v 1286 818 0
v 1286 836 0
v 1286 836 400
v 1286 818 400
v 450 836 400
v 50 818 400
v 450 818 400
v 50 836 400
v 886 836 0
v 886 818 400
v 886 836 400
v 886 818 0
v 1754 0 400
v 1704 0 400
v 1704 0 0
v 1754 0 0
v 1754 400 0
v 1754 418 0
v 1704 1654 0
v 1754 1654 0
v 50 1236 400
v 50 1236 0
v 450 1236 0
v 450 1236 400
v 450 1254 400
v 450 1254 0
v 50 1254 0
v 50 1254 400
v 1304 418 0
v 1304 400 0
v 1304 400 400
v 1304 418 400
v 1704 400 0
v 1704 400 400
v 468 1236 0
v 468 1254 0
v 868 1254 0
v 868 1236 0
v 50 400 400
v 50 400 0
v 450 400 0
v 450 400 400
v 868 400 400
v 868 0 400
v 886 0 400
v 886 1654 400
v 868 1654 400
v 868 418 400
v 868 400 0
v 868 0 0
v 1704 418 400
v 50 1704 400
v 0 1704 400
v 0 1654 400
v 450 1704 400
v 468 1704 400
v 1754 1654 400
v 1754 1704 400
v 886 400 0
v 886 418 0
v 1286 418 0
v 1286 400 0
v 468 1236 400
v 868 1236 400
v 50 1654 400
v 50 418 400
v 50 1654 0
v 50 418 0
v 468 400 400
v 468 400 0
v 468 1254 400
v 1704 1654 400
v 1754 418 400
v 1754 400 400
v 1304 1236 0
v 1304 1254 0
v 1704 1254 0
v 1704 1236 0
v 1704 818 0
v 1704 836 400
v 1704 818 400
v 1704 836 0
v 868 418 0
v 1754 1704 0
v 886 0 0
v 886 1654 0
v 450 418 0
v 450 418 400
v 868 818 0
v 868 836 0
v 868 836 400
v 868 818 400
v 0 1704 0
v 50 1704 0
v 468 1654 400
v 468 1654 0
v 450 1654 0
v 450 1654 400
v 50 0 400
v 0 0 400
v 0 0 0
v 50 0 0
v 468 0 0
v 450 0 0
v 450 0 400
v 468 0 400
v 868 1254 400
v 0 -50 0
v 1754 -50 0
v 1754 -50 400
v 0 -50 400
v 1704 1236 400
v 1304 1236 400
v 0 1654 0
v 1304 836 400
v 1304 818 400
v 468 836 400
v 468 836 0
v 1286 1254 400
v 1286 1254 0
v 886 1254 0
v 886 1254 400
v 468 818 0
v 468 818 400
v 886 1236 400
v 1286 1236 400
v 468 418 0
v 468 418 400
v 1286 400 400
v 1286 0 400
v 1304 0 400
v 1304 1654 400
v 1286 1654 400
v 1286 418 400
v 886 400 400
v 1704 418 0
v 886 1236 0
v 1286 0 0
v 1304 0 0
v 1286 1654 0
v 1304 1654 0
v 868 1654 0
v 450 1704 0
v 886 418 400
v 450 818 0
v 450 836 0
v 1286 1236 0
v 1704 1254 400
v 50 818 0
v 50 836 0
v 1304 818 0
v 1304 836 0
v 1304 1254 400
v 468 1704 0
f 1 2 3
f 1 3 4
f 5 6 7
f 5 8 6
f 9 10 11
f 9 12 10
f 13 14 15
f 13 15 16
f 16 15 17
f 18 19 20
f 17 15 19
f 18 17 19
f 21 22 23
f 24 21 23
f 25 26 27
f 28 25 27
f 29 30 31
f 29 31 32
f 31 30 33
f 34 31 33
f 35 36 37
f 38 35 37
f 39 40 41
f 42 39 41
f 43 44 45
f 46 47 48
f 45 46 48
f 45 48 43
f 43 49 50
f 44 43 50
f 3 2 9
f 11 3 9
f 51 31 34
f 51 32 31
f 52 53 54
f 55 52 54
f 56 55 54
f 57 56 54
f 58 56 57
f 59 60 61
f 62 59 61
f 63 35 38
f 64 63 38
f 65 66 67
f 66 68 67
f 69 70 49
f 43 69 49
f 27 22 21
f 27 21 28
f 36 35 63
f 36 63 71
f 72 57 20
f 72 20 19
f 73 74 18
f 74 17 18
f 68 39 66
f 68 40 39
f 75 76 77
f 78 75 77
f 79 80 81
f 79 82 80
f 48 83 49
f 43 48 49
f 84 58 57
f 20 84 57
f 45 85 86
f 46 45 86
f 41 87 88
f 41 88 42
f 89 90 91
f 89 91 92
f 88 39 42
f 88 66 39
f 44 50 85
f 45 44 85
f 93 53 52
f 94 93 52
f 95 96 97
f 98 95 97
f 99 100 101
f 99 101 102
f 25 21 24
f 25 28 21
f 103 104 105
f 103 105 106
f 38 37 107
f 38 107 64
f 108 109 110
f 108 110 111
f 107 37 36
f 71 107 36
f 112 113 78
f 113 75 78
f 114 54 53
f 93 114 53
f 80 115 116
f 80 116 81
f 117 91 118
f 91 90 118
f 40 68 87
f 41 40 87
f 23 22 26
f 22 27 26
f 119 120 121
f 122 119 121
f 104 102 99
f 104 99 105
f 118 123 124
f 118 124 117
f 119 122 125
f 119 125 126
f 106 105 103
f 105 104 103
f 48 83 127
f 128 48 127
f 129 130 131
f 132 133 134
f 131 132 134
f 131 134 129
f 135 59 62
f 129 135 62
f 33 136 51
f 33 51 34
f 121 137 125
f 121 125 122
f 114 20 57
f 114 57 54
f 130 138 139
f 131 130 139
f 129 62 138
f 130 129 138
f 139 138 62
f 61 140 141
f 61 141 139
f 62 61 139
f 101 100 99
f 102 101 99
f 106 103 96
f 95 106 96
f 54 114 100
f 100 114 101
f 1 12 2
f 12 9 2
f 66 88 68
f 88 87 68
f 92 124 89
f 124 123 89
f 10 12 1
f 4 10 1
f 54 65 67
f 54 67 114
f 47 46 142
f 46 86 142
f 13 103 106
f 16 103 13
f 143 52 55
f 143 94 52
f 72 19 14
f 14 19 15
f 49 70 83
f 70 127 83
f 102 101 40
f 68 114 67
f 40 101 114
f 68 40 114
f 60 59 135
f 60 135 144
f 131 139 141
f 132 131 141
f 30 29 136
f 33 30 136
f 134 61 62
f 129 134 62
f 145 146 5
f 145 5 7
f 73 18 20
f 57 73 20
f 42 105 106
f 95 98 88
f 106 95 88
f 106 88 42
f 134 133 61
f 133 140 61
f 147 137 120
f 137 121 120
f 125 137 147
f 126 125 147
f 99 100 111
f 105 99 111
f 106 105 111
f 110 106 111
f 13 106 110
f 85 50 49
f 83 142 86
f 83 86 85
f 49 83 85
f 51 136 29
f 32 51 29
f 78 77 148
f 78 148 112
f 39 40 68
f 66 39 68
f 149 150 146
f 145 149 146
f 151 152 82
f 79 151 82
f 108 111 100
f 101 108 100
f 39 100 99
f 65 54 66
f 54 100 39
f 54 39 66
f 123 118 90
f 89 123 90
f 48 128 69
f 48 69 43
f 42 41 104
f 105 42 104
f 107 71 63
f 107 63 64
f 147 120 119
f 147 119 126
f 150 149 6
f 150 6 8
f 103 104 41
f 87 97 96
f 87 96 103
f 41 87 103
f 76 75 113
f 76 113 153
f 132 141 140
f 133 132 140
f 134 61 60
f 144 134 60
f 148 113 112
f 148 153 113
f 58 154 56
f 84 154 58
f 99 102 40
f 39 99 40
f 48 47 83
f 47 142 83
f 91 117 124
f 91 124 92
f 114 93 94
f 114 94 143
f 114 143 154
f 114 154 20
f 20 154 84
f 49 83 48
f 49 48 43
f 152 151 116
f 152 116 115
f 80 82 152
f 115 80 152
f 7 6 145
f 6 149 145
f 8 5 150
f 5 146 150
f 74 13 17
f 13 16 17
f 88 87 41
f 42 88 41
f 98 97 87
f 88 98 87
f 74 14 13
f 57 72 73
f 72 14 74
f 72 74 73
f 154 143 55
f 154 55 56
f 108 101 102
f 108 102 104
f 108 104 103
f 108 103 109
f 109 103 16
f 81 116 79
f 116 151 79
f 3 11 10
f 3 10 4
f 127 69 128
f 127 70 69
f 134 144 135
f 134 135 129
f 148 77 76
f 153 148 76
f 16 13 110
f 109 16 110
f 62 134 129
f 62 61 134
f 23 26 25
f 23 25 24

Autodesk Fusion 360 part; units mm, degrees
sketch "Sketch1" plane through (0, 0, 0) normal (0, 0, 1) x (1, 0, 0)
  line L0 (0, 0) -> (50, 0)
  line L1 (50, 0) -> (50, 1654)
  line L2 (50, 1654) -> (0, 1654)
  line L3 (0, 1654) -> (0, 0)
  line L4 (0, 0) -> (1754, 0)
  line L5 (1754, 0) -> (1754, -50)
  line L6 (1754, -50) -> (0, -50)
  line L7 (0, -50) -> (0, 0)
  line L8 (450, 0) -> (468, 0)
  line L9 (468, 0) -> (468, 1654)
  line L10 (468, 1654) -> (450, 1654)
  line L11 (450, 1654) -> (450, 0)
  line L12 (50, 400) -> (450, 400)
  line L13 (450, 400) -> (450, 418)
  line L14 (450, 418) -> (50, 418)
  line L15 (50, 418) -> (50, 400)
  dimension "d7" = 1654
  dimension "d8" = 50
  dimension "d9" = 1754
  dimension "d10" = 50
  dimension "d12" = 18
  dimension "d13" = 400
  dimension "d14" = 1654
  dimension "d15" = 18
  dimension "d16" = 400
extrude "Extrude1" add sketch "Sketch1" along normal blind 400 contours L0 L4 L5 L6 L7 L8 makes body 1 in component "Dik Horizontaal"
extrude "Extrude1'" add sketch "Sketch1" along normal blind 400 separate body contours L0 L1 L2 L3 L4 L15 makes body 2 in component "Dik Vertikaal"
extrude "Extrude1''" add sketch "Sketch1" along normal blind 400 separate body contours L1 L11 L12 L13 L14 L15 makes body 3 in component "Dun Horizontaal"
extrude "Extrude1'''" add sketch "Sketch1" along normal blind 400 separate body contours L4 L8 L9 L10 L11 L13 makes body 4 in component "Dun Vertikaal"
pattern_linear "Patroon planken dun horizontaal" [suppressed]
pattern_linear "Patroon planken dun vertikaal" [suppressed]
pattern_linear "Patroon planken dik vertikaal" [suppressed]
pattern_linear "Patroon planken dik horizontaal" [suppressed]
component "Dik Horizontaal" placed x (1, 0, 0) y (0, 1, 0) z (0, 0, 1) at (0, 0, 0)
component "Dik Vertikaal" placed x (1, 0, 0) y (0, 1, 0) z (0, 0, 1) at (0, 0, 0)
component "Dun Horizontaal" placed x (1, 0, 0) y (0, 1, 0) z (0, 0, 1) at (0, 0, 0)
component "Dun Vertikaal" placed x (1, 0, 0) y (0, 1, 0) z (0, 0, 1) at (0, 0, 0)
component "Dun Vertikaal" placed x (1, 0, 0) y (0, 1, 0) z (0, 0, 1) at (418, 0, 0)
component "Dun Vertikaal" placed x (1, 0, 0) y (0, 1, 0) z (0, 0, 1) at (836, 0, 0)
component "Dik Vertikaal" placed x (1, 0, 0) y (0, 1, 0) z (0, 0, 1) at (1704, 0, 0)
component "Dun Horizontaal" placed x (1, 0, 0) y (0, 1, 0) z (0, 0, 1) at (0, 418, 0)
component "Dun Horizontaal" placed x (1, 0, 0) y (0, 1, 0) z (0, 0, 1) at (0, 836, 0)
component "Dun Horizontaal" placed x (1, 0, 0) y (0, 1, 0) z (0, 0, 1) at (418, 0, 0)
component "Dun Horizontaal" placed x (1, 0, 0) y (0, 1, 0) z (0, 0, 1) at (418, 418, 0)
component "Dun Horizontaal" placed x (1, 0, 0) y (0, 1, 0) z (0, 0, 1) at (418, 836, 0)
component "Dun Horizontaal" placed x (1, 0, 0) y (0, 1, 0) z (0, 0, 1) at (836, 0, 0)
component "Dun Horizontaal" placed x (1, 0, 0) y (0, 1, 0) z (0, 0, 1) at (836, 418, 0)
component "Dun Horizontaal" placed x (1, 0, 0) y (0, 1, 0) z (0, 0, 1) at (836, 836, 0)
component "Dun Horizontaal" placed x (1, 0, 0) y (0, 1, 0) z (0, 0, 1) at (1254, 0, 0)
component "Dun Horizontaal" placed x (1, 0, 0) y (0, 1, 0) z (0, 0, 1) at (1254, 418, 0)
component "Dun Horizontaal" placed x (1, 0, 0) y (0, 1, 0) z (0, 0, 1) at (1254, 836, 0)
component "Dik Horizontaal" placed x (1, 0, 0) y (0, 1, 0) z (0, 0, 1) at (0, 1704, 0)
equation "VakHoogte = 400 mm"
equation "VakBreedte = 400 mm"
equation "VakDiepte = 400 mm"
equation "PlankDikteZei = 50 mm"
equation "d7 = ( AantalVertikaal * VakHoogte ) + ( ( AantalVertikaal - 1 ) * PlankDikteMid )"
equation "d8 = PlankDikteZei"
equation "d9 = Linear Dimension-4"
equation "d10 = PlankDikteZei"
equation "PlankDikteMid = 18 mm"
equation "d12 = PlankDikteMid"
equation "d13 = VakBreedte"
equation "d14 = ( AantalVertikaal * VakHoogte ) + ( ( AantalVertikaal - 1 ) * PlankDikteMid )"
equation "d15 = PlankDikteMid"
equation "d16 = VakHoogte"
equation "d17 = VakDiepte"
equation "d19 = VakDiepte"
equation "d21 = VakDiepte"
equation "d23 = VakDiepte"
equation "d25 = AantalVertikaal - 1"
equation "d27 = ( VakHoogte * -1 ) - PlankDikteMid"
equation "d28 = VakBreedte + PlankDikteMid"
equation "d29 = AantalHorizontaal - 1"
equation "d31 = VakBreedte + PlankDikteMid"
properties part number "123"
